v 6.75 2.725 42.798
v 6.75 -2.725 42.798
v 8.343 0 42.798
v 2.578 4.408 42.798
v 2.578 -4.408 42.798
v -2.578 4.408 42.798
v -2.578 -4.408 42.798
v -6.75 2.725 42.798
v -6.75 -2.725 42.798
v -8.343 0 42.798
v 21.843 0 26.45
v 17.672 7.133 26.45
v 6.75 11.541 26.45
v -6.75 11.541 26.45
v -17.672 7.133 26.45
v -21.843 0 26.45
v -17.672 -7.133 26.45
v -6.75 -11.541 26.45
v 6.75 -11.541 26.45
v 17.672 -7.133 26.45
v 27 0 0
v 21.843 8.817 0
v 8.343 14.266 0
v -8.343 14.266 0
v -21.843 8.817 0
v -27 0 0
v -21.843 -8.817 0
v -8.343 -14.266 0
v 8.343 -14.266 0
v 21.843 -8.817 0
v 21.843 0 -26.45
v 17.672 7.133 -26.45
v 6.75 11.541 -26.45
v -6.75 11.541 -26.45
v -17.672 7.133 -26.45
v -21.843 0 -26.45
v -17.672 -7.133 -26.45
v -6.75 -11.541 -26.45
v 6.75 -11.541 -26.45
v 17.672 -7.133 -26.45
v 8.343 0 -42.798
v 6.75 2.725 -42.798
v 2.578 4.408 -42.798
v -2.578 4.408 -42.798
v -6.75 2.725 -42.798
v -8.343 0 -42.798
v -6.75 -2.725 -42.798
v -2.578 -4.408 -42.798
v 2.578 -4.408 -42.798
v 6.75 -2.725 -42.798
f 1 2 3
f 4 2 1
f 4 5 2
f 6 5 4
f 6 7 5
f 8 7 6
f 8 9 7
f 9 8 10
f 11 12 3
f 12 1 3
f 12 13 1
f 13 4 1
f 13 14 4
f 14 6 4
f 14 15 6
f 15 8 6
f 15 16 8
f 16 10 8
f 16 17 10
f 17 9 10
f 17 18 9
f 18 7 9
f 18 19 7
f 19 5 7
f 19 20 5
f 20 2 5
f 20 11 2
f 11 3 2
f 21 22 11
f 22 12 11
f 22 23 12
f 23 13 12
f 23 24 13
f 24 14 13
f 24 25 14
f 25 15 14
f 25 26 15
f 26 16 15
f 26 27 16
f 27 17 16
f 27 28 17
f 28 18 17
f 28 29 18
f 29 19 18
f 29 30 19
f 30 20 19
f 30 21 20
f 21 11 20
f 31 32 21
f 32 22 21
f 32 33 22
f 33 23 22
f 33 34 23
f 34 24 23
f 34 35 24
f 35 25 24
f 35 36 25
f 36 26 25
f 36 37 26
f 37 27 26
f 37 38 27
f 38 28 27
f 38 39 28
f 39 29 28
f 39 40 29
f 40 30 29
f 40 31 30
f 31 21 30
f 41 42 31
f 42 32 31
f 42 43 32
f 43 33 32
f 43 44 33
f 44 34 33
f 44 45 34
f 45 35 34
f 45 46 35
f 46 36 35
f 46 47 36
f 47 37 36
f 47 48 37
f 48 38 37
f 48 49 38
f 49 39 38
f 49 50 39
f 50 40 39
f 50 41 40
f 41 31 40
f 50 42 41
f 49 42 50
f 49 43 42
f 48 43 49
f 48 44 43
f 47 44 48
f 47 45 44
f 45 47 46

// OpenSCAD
// Generated by SolidPython 1.0.1 on 2020-07-29 00:46:48


scale(v = [9, 5, 15]) {
	sphere(r = 3);
}
/***********************************************
*********      SolidPython code:      **********
************************************************
 
# import packages: SolidPython
from solid import *
from solid.utils import *
from itertools import chain, combinations, permutations


class Resize:

    def __init__(self, scad_file):
        self.scad_file = scad_file
        #self.scad_file = import_scad(scad_file)
        # cone/cylinder param:
        self.r1 = 0
        self.r2 = 0
        self.h = 0
        # rectangular prism param:
        self.w = 0
        self.l = 0
        # ellipse param:
        self.r = 0

    # import OpenScad code (file name corresponds to shape)


    # classify shape + parameters
    def assign(self, param1, param2, param3):
        if self.scad_file == 'cone.scad':
            self.r1 = param1
            self.r2 = param2
            self.h = param3
        elif self.scad_file == 'cylinder.scad':
            self.r1 = param1
            self.r2 = param2
            self.h = param3
        elif self.scad_file == 'rectangularPrism.scad':
            self.h = param1
            self.l = param2
            self.w = param3
        else:
            self.r = param1
            self.h = param2

    # resize parameters
    def iterate(self):
        x = range(3, 20, 2)
        i = 1
        if self.scad_file == 'cone.scad':
            tempList = list(permutations(x, 2))
            for temp in tempList:
                param1 = temp[0]
                param2 = temp[1]
                filepath = 'produced_scad_files/' + 'cone' + str(param1) + '_' + str(param2) + '_' + '.scad'
                scad_render_to_file(cylinder(h=param1, r1=param2, r2=0), filepath)

        elif self.scad_file == 'cylinder.scad':
            tempList = list(permutations(x, 3))
            for temp in tempList:
                param1 = temp[0]
                param2 = temp[1]
                filepath = 'produced_scad_files/' + 'cylinder' + str(param1) + '_' + str(param2) + '_' + '.scad'
                scad_render_to_file(cylinder(h=param1, r1=param2, r2=param2), filepath)

        elif self.scad_file == 'rectangularPrism.scad':
            tempList = list(permutations(x, 3))
            for temp in tempList:
                param1 = temp[0]
                param2 = temp[1]
                param3 = temp[2]
                filepath = 'produced_scad_files/' + 'rectangularPrism' + str(param1) + '_' + str(param2) + '_' + str(
                    param3) + '.scad'
                scad_render_to_file(cube(size=(param1, param2, param3)), filepath)

        elif self.scad_file == 'ellipse.scad':
            tempList = list(permutations(x, 4))
            for temp in tempList:
                param1 = temp[0]
                param2 = temp[1]
                param3 = temp[2]
                param4 = temp[3]
                filepath = 'produced_scad_files/' + 'ellipse' + str(param1) + '_' + str(param2) + '_' + str(param3) + '_' + str(param4) + '.scad'
                scad_render_to_file(scale([param1, param2, param3])(sphere(r=param4)), filepath)

    def render_to_scadfile(self):
        scad_render_to_file(scad, 'example.scad') 
 
************************************************/
